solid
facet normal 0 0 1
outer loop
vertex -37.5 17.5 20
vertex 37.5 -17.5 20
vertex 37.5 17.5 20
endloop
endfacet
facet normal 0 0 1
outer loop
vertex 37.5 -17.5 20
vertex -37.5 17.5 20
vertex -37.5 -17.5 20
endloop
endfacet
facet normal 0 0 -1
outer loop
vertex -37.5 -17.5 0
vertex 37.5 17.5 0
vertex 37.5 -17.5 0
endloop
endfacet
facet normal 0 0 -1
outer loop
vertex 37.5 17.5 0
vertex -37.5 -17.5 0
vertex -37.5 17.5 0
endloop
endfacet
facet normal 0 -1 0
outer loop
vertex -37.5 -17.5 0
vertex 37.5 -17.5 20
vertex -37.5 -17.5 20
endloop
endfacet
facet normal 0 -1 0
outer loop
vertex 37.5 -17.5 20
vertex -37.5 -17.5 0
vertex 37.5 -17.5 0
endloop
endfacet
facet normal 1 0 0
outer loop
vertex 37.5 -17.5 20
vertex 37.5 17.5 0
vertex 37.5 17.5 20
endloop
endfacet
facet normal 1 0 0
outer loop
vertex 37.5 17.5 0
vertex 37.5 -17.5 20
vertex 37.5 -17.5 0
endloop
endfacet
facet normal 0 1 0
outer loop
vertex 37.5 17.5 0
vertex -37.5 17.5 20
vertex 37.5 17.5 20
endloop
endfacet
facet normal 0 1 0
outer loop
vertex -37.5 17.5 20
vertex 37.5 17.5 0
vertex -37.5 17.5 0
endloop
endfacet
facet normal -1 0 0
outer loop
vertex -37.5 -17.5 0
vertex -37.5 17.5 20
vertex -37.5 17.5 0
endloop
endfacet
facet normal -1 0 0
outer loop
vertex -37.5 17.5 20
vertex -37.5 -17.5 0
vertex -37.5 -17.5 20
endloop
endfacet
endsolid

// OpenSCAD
// Generated documentary F1 envelope proxy.
// Not manufacturing geometry, not dimensionally validated, not SimReady.
proxy_id = "993-INTERCOOLER-TEMPERATURE-SENSOR";
$fn = 96;

length_mm = 75;
width_mm = 35;
height_mm = 20;

translate([-length_mm / 2, -width_mm / 2, 0])
    cube([length_mm, width_mm, height_mm], center = false);
